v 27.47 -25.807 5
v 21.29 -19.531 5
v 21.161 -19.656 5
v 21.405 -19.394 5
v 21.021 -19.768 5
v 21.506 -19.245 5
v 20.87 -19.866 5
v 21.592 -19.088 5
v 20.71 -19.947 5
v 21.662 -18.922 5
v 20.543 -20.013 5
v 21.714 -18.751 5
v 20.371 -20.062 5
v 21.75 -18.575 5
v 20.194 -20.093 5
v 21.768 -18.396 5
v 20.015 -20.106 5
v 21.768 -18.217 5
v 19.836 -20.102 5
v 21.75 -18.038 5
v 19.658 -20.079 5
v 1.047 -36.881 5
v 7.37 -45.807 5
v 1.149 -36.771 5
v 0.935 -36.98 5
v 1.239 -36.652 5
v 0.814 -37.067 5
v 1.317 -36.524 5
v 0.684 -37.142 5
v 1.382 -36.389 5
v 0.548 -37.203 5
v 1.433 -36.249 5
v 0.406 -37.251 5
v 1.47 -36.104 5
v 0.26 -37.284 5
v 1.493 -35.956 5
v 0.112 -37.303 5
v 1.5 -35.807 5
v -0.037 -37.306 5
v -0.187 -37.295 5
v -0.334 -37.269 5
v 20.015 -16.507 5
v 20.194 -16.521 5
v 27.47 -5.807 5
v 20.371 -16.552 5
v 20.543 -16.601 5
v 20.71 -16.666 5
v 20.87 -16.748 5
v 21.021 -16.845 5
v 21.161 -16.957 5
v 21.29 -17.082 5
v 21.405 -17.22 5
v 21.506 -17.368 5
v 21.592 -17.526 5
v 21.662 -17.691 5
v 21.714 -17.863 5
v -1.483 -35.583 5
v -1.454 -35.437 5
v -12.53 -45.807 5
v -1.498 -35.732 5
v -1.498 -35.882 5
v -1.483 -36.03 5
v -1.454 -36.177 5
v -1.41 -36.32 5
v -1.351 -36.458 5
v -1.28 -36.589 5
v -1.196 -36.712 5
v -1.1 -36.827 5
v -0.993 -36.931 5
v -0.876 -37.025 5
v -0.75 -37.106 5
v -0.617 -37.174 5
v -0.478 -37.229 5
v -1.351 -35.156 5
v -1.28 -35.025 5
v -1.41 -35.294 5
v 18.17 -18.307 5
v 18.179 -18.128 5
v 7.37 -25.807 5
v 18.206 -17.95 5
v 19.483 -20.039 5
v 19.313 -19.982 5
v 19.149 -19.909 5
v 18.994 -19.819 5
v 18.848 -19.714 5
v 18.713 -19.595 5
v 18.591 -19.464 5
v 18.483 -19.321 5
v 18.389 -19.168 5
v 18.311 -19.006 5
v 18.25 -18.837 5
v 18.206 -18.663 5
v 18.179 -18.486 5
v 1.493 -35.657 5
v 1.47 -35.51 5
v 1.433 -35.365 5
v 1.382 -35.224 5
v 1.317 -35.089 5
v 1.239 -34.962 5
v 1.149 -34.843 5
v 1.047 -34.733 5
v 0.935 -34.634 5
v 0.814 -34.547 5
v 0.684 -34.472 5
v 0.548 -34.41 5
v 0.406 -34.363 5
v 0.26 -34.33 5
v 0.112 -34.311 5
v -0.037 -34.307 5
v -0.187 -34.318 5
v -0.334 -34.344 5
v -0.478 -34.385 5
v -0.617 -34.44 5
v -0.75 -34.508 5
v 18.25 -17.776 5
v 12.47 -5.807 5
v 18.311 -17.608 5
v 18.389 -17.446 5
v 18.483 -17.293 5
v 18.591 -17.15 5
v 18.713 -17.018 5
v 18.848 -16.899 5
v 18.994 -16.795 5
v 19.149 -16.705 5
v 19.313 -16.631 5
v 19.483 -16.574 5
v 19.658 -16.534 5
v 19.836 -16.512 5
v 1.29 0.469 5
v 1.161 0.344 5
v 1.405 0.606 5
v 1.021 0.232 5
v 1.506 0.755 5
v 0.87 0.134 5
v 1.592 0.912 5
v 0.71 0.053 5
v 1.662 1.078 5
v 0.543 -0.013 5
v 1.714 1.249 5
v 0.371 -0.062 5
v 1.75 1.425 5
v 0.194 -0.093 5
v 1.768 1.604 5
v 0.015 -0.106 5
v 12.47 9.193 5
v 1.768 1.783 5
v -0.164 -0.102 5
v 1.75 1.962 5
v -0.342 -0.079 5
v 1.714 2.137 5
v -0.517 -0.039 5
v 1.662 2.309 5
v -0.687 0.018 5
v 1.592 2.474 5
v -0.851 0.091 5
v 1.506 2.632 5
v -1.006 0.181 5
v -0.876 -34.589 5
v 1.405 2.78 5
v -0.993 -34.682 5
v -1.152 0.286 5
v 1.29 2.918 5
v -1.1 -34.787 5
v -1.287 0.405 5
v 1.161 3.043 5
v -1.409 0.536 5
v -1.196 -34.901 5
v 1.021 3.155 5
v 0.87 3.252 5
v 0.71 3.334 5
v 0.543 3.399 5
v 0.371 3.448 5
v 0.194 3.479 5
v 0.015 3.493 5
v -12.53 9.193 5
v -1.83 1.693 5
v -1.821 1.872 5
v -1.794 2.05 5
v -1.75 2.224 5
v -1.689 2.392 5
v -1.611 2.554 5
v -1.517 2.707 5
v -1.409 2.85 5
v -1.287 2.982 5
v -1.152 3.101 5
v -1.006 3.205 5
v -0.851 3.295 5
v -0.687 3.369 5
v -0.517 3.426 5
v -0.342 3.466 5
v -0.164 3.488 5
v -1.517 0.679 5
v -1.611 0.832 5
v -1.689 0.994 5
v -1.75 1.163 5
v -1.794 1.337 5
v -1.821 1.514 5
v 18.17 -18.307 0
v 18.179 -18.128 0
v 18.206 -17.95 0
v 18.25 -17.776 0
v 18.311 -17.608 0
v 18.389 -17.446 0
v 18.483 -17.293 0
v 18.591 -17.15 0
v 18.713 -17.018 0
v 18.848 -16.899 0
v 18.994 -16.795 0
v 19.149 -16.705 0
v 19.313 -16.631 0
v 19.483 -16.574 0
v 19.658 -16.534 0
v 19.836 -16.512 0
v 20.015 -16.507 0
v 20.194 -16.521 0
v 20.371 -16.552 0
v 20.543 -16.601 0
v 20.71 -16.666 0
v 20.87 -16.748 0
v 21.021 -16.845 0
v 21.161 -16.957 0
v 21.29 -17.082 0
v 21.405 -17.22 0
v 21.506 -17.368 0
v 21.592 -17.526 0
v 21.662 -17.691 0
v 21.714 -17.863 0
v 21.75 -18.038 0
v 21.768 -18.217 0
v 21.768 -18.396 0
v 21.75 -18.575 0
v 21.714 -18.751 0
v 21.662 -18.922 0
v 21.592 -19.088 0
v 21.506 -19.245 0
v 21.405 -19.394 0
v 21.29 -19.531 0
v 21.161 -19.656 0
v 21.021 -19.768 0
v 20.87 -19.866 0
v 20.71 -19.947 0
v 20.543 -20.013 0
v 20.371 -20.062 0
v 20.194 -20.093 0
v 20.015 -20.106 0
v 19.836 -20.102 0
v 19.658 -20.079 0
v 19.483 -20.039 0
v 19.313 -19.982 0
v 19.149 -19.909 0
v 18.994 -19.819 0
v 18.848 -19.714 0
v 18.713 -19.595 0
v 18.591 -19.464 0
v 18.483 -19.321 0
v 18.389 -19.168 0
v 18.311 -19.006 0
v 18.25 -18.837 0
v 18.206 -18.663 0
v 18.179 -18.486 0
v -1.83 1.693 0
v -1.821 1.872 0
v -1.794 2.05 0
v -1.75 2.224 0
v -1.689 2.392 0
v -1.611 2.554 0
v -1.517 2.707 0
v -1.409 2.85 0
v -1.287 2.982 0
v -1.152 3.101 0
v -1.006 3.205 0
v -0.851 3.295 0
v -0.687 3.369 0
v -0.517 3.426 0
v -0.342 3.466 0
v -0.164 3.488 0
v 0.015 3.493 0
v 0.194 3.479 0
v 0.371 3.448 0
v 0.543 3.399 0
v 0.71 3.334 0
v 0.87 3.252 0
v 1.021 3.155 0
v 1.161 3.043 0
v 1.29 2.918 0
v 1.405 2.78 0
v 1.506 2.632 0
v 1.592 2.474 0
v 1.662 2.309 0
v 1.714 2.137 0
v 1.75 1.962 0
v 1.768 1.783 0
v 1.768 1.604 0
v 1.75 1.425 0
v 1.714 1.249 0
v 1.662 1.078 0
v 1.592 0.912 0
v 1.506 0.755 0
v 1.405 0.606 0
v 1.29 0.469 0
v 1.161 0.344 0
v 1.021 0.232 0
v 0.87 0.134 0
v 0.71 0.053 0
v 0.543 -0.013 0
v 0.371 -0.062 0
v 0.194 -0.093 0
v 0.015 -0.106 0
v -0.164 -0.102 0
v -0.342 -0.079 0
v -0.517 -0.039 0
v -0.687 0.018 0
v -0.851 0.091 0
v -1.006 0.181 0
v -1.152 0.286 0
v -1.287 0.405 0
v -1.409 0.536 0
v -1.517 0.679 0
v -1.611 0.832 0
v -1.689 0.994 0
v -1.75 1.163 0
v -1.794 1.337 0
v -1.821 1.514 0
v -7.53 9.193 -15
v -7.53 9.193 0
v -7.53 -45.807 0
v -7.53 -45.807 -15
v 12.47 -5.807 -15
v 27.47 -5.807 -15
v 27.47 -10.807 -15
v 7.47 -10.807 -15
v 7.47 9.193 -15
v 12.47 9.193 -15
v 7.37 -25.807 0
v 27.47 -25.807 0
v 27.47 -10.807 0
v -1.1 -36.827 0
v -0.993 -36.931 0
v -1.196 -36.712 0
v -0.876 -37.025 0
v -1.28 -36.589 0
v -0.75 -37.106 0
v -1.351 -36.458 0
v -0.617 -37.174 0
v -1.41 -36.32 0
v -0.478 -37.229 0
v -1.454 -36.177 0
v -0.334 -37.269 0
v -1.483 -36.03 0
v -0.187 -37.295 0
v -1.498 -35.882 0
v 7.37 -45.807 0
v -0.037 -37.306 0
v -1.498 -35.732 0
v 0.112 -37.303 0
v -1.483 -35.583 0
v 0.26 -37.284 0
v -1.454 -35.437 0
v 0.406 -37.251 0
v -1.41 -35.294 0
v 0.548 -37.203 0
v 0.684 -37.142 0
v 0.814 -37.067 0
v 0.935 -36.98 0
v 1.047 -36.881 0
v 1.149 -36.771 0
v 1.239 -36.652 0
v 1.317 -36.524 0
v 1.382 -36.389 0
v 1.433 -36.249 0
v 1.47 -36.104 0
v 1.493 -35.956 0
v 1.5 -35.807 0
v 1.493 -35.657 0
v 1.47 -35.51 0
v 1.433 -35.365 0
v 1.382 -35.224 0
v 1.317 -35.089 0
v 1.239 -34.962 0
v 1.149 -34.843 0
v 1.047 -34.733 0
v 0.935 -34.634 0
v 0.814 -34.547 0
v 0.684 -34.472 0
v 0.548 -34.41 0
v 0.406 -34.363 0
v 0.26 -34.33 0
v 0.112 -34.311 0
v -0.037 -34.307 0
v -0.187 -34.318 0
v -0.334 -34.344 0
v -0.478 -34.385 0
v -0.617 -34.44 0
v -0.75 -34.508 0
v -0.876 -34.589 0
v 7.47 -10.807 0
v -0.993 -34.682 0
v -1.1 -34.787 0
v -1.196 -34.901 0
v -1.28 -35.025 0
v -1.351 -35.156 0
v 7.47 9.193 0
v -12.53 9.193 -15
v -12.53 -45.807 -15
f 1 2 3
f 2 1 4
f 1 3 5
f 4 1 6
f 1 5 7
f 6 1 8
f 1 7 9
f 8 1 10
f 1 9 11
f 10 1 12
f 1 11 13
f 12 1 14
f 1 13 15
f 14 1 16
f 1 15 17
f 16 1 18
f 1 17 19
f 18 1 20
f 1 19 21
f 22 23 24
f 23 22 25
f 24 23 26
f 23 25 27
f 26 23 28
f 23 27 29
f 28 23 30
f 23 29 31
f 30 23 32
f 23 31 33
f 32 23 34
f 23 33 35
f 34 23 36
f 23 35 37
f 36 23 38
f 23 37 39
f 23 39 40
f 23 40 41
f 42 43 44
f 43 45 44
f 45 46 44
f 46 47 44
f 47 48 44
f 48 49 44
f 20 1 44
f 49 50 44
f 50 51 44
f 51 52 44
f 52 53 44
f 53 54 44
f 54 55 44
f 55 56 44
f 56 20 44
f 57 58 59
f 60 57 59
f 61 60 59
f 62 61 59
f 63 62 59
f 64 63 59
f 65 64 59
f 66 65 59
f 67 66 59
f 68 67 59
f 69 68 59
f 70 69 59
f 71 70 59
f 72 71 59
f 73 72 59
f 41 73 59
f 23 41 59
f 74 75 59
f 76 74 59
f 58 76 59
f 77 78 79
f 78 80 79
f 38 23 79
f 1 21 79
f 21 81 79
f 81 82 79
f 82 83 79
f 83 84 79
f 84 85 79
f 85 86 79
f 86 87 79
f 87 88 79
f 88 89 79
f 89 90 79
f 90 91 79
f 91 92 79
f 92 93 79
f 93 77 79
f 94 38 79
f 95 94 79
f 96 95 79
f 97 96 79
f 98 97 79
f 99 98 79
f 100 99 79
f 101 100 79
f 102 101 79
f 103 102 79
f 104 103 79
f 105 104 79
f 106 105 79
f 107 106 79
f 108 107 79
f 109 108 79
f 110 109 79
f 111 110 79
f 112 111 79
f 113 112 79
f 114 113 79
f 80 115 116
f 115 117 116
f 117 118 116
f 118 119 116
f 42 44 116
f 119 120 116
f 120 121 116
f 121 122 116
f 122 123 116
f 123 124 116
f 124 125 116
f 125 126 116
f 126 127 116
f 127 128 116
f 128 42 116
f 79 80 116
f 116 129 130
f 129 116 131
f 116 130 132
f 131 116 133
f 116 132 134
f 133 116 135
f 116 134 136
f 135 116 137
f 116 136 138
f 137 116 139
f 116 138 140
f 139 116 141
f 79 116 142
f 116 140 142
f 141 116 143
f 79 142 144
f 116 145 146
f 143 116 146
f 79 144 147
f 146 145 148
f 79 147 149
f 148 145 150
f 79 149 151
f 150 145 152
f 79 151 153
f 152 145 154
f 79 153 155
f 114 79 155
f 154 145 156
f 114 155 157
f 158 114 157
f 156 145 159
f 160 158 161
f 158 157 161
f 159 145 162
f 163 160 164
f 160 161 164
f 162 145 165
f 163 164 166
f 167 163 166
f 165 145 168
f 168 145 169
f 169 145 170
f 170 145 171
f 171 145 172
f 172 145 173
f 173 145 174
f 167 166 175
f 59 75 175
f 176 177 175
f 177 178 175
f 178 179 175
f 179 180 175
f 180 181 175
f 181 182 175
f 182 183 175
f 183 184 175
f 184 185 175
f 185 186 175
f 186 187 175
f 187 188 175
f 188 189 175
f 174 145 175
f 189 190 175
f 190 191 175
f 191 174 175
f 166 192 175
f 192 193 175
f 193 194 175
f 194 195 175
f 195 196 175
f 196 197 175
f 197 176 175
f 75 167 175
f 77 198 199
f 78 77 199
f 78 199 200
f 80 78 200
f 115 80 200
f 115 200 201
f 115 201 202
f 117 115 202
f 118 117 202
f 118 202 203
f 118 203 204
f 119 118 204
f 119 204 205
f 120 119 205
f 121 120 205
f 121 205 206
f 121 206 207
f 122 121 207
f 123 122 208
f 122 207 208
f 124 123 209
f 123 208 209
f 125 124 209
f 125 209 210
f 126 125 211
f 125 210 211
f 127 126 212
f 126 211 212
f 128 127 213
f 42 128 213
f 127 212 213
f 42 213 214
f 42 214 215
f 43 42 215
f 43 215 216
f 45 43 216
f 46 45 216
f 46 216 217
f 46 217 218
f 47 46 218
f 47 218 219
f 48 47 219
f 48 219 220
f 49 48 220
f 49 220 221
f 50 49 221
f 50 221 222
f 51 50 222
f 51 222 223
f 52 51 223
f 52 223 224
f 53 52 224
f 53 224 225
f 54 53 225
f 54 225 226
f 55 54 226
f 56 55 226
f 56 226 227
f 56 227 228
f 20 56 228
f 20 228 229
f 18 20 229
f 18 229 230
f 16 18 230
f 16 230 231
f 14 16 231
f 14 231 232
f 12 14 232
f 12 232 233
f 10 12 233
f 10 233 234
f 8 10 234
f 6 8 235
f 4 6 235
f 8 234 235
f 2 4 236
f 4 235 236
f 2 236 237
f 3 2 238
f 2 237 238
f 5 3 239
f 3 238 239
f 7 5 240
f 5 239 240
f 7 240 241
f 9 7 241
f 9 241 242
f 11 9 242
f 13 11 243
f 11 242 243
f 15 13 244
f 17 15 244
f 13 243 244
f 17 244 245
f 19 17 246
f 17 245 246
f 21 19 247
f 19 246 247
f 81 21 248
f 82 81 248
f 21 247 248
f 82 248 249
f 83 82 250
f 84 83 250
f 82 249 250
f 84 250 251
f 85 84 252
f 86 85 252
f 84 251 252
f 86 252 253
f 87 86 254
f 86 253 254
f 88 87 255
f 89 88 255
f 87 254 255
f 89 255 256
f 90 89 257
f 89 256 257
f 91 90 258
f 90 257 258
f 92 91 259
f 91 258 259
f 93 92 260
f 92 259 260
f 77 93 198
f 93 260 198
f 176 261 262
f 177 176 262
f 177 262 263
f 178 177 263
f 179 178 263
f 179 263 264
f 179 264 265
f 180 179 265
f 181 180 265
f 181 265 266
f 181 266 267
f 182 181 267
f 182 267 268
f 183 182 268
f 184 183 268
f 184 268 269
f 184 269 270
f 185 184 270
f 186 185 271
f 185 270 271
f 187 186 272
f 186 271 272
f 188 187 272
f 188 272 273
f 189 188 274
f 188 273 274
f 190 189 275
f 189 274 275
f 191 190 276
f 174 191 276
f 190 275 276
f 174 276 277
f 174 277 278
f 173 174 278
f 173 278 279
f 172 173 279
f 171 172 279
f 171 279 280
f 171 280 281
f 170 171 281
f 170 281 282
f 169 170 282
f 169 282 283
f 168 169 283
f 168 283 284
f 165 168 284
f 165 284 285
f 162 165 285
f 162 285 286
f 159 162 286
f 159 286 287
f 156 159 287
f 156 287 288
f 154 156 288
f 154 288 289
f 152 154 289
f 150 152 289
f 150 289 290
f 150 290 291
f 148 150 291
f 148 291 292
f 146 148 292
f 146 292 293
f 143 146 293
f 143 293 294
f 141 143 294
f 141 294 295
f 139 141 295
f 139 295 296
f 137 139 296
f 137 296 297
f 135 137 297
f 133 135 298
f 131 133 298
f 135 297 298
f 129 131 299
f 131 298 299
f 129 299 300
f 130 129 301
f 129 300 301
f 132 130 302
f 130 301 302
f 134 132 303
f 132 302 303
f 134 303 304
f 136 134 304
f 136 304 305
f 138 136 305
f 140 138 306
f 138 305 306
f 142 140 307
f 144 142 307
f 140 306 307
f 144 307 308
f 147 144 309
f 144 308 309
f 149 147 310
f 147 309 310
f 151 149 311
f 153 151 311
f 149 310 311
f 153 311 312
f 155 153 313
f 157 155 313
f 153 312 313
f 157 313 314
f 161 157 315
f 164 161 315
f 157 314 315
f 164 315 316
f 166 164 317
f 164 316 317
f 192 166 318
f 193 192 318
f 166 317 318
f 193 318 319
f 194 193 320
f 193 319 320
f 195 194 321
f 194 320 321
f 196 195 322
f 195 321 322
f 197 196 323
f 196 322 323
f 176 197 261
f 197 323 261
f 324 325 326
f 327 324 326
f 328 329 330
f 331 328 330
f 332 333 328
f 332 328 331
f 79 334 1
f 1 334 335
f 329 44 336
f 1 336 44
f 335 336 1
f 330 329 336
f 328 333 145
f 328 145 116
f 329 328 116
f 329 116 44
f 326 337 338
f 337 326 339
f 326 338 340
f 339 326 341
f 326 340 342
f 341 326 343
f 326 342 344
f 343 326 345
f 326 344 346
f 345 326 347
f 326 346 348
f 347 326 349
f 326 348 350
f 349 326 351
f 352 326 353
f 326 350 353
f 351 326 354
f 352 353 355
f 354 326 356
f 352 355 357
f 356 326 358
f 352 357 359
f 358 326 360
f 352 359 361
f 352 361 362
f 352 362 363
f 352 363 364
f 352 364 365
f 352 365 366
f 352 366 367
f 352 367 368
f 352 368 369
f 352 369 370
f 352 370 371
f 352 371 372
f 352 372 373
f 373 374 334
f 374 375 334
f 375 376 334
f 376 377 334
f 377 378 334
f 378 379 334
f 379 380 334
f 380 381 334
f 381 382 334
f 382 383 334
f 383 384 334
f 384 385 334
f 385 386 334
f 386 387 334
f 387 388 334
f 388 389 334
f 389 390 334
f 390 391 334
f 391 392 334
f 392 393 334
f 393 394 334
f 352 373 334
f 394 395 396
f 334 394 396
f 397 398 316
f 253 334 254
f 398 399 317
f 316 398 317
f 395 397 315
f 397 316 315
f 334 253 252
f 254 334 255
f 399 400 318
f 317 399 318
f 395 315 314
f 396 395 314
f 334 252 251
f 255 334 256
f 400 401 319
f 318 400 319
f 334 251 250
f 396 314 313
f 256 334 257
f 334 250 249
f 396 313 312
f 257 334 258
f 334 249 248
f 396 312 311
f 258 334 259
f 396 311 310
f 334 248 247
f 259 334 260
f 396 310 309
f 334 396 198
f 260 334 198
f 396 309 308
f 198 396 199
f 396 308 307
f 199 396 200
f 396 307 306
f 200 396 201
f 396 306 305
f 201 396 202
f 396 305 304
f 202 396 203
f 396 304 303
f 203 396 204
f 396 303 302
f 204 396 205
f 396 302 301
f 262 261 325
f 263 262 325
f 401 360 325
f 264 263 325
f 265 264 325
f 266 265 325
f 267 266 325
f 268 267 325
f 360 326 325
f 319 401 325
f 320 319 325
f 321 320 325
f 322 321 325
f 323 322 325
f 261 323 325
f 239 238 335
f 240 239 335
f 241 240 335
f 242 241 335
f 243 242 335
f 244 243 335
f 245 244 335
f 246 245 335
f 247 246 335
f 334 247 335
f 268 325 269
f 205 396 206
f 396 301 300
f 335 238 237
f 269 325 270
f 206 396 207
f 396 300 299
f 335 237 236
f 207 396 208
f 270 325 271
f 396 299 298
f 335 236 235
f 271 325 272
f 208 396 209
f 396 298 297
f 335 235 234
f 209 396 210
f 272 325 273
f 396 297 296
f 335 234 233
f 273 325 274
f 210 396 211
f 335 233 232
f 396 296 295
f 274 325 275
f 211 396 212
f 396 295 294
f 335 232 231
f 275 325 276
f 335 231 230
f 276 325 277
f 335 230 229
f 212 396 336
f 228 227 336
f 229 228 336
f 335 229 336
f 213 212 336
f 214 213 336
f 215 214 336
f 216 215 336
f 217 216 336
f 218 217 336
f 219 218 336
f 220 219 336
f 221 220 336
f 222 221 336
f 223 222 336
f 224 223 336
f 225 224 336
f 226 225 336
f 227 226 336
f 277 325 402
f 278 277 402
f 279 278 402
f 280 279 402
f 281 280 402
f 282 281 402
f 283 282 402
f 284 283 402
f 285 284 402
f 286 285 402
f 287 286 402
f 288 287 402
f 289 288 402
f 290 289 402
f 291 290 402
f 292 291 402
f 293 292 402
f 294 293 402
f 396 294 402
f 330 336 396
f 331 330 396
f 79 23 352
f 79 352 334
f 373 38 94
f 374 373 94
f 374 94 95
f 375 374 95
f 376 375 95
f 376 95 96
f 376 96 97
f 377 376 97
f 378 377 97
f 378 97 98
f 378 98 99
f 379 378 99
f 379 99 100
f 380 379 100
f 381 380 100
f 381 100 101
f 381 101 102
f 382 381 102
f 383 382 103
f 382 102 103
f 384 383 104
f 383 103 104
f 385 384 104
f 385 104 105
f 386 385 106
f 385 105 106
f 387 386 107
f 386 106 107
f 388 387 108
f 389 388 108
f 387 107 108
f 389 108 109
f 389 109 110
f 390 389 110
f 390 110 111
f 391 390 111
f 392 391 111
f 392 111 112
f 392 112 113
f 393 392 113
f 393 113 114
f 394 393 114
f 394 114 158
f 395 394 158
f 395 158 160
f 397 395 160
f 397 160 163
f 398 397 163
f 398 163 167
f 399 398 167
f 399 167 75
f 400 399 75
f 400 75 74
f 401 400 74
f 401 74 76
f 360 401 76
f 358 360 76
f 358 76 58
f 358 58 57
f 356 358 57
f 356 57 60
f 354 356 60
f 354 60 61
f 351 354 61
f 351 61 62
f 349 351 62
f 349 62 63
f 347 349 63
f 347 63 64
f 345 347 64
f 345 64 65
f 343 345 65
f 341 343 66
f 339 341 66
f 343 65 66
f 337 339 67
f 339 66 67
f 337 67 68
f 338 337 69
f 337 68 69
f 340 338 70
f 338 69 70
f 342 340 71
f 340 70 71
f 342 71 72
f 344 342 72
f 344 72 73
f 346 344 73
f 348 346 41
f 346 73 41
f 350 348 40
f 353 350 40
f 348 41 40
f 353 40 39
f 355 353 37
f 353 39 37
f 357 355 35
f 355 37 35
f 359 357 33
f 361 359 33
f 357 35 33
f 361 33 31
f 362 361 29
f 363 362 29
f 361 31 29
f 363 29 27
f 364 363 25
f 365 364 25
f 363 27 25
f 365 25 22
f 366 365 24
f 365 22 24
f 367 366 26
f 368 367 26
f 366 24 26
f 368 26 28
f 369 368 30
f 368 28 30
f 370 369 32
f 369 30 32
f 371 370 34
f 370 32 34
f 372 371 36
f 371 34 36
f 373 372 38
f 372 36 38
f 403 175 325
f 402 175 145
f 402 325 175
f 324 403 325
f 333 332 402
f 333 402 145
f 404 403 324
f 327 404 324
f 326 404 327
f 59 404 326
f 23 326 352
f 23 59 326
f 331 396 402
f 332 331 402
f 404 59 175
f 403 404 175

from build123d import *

# Parameters (mm, degrees)
BOSS_EXTRUDE1_DEPTH = 5
BOSS_EXTRUDE2_DEPTH = 15
BOSS_EXTRUDE3_DEPTH = 15
SKETCH4_R           = 1.8
CUT_EXTRUDE1_DEPTH  = 6
SKETCH6_W           = 14.9
SKETCH6_H           = 20
BOSS_EXTRUDE4_DEPTH = 5
SKETCH8_R           = 1.5
CUT_EXTRUDE3_DEPTH  = 21
SKETCH9_W           = 5
SKETCH9_H           = 55
BOSS_EXTRUDE5_DEPTH = 5
BOSS_EXTRUDE6_DEPTH = 5


with BuildPart() as part:
    # Sketch1 → Boss-Extrude1 (new body)
    with BuildSketch(Plane.XY):
        Polygon((7.370119522, -25.806772908), (27.470119522, -25.806772908), (27.470119522, -10.806772908), (7.470119522, -10.806772908), (7.470119522, 9.193227092), (-7.529880478, 9.193227092), (-7.529880478, -25.806772908), align=None)
    extrude(amount=BOSS_EXTRUDE1_DEPTH)

    # Sketch4 → Cut-Extrude1 (cut, through all)
    with BuildSketch(Plane(origin=(0, 0, 0), x_dir=(-1, 0, 0), z_dir=(0, 0, -1))):
        with Locations((0.029880478, 1.693227092)):
            Circle(SKETCH4_R)
        with Locations((-19.970119522, -18.306772908)):
            Circle(SKETCH4_R)
    extrude(amount=-CUT_EXTRUDE1_DEPTH, mode=Mode.SUBTRACT)

    # Sketch6 → Boss-Extrude4 (add)
    with BuildSketch(Plane.XY.offset(5)):
        with Locations((-0.079880478, -35.806772908)):
            Rectangle(SKETCH6_W, SKETCH6_H)
    extrude(amount=-BOSS_EXTRUDE4_DEPTH)

    # Sketch8 → Cut-Extrude3 (cut, through all)
    with BuildSketch(Plane.XY.offset(5)):
        with Locations((0, -35.806772908)):
            Circle(SKETCH8_R)
    extrude(amount=-CUT_EXTRUDE3_DEPTH, mode=Mode.SUBTRACT)



with BuildPart() as body_2:
    # Sketch2 → Boss-Extrude2 (new body)
    with BuildSketch(Plane(origin=(0, 0, 0), x_dir=(-1, 0, 0), z_dir=(0, 0, -1))):
        Polygon((-7.470119522, 9.193227092), (-12.470119522, 9.193227092), (-12.470119522, -5.806772908), (-27.470119522, -5.806772908), (-27.470119522, -10.806772908), (-7.470119522, -10.806772908), align=None)
    extrude(amount=BOSS_EXTRUDE2_DEPTH)


with BuildPart() as body_3:
    # Sketch3 → Boss-Extrude3 (new body)
    with BuildSketch(Plane(origin=(0, 0, 0), x_dir=(-1, 0, 0), z_dir=(0, 0, -1))):
        Polygon((7.529880478, 9.193227092), (12.529880478, 9.193227092), (12.529880478, -45.806772908), (7.529880478, -45.806772908), (7.529880478, -25.806772908), align=None)
    extrude(amount=BOSS_EXTRUDE3_DEPTH)


with BuildPart() as part_1:
    add(part.part)

    add(body_3.part)  # Boss-Extrude5 merges body 3
    # Sketch9 → Boss-Extrude5 (add)
    with BuildSketch(Plane.XY.offset(5)):
        with Locations((-10.029880478, -18.306772908)):
            Rectangle(SKETCH9_W, SKETCH9_H)
    extrude(amount=-BOSS_EXTRUDE5_DEPTH)


    add(body_2.part)  # Boss-Extrude6 merges body 2
    # Sketch10 → Boss-Extrude6 (add)
    with BuildSketch(Plane.XY):
        Polygon((7.470119522, 9.193227092), (12.470119522, 9.193227092), (12.470119522, -5.806772908), (27.470119522, -5.806772908), (27.470119522, -10.806772908), (7.470119522, -10.806772908), align=None)
    extrude(amount=BOSS_EXTRUDE6_DEPTH)


solid = part_1.part
